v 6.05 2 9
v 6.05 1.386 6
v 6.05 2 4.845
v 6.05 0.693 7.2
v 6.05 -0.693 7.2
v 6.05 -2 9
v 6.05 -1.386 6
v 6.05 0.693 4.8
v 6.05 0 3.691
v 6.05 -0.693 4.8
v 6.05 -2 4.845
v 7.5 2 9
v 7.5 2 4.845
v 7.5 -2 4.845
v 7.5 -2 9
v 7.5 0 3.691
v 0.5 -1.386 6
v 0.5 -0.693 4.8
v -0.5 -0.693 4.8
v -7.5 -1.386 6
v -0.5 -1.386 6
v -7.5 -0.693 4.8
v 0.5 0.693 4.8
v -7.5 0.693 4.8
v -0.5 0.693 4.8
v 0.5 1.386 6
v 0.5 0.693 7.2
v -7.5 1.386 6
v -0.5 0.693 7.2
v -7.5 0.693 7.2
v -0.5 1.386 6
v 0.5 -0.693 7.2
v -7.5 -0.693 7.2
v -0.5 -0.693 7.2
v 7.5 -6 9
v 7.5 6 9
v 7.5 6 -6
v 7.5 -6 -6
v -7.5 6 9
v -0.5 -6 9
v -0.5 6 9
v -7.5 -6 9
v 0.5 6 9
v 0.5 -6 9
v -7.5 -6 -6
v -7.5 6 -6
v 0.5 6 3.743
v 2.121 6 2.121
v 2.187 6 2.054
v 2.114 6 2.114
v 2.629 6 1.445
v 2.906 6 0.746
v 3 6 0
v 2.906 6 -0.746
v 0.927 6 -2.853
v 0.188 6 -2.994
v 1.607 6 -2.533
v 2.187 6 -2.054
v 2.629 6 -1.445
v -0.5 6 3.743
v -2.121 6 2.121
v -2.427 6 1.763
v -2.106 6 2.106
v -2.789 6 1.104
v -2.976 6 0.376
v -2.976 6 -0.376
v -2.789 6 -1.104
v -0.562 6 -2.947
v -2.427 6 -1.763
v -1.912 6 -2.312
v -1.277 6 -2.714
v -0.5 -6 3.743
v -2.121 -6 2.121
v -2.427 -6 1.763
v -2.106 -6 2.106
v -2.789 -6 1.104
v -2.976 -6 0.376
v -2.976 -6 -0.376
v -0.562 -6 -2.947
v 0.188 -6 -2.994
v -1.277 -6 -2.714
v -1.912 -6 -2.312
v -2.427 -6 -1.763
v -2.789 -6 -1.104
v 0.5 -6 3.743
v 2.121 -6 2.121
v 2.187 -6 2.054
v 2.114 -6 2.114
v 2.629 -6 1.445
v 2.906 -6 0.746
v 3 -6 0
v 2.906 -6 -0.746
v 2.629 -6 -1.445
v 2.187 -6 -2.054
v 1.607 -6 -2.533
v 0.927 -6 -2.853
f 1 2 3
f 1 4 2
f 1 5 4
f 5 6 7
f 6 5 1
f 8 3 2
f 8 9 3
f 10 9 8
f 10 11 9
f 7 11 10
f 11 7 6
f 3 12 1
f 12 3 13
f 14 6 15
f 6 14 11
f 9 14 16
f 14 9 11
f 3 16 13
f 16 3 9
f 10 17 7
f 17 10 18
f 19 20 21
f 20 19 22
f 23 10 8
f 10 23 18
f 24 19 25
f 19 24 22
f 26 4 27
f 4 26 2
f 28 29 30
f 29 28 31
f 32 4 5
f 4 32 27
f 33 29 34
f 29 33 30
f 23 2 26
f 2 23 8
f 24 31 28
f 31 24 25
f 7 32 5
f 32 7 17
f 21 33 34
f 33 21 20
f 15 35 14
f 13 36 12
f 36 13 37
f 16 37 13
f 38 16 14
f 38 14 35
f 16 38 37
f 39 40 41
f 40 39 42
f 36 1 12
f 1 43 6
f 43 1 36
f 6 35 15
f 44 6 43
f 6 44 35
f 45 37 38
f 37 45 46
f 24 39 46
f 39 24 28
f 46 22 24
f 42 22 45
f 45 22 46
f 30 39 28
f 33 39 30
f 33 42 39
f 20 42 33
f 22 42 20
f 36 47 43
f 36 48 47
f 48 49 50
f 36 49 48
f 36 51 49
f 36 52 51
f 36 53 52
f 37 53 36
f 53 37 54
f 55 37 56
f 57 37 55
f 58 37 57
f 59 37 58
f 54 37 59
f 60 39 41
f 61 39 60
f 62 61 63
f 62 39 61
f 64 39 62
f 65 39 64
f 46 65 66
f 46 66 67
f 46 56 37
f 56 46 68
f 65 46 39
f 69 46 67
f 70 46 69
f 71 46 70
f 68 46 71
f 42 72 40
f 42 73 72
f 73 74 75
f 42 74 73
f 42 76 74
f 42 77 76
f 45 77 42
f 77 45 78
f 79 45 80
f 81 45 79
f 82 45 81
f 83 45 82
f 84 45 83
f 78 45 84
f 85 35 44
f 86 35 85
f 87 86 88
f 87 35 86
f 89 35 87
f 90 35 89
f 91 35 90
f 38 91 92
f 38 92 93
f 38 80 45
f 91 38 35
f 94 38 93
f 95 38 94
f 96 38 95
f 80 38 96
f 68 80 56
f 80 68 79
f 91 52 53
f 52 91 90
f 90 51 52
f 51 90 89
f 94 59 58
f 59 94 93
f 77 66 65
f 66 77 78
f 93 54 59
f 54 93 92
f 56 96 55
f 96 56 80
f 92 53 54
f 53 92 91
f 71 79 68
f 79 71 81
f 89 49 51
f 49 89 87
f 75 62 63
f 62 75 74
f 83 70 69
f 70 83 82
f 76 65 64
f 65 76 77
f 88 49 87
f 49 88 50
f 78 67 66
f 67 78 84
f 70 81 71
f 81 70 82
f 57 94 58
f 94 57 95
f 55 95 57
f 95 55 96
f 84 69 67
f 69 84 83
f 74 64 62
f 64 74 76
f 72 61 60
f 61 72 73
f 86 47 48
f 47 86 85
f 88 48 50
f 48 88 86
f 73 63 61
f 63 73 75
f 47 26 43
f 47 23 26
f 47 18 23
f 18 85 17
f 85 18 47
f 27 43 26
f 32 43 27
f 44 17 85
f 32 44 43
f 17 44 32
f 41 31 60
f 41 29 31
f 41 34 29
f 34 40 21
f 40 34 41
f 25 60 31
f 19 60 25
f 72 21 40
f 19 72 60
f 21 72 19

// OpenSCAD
pi = 3.1415926535897932384626433832795;

////////////////////////////////////////////////////////////////////////////////////////////////
//                                 Module list                                                              //
////////////////////////////////////////////////////////////////////////////////////////////////

//	RodClamp()


////////////////////////////////////////////////////////////////////////////////////////////////
//                                 Module parameters                                                  //
////////////////////////////////////////////////////////////////////////////////////////////////

//RodClamp()
//	width = width of main block
//	height = height of main block
//	depth = depth of main block
//	boreheight = height of center of shaft from base
//	boreradius = radius of bore
//	gapwidth = width of clamp gap
//	screwbore = bore hole radius for clamp screw
//	screwstyle = 0-hex side aligned, 1-hex top aligned, 2-round
//	captivestyle = 0-hex side aligned, 1-hex top aligned, 2-square open to top, 3-hex base open top
//	captivebore = bore hole radius of captive nut
//	captivedepth = thicknes of captuve nut


////////////////////////////////////////////////////////////////////////////////////////////////
//                                 Module definitions                                                   //
////////////////////////////////////////////////////////////////////////////////////////////////

module RodClamp()
{
  //width = width of main block
  //height = height of main block
  //depth = depth of main block
  //boreheight = height of center of shaft from base
  //boreradius = radius of bore
  //gapwidth = width of clamp gap
  //screwbore = bore hole radius for clamp screw
  //screwstyle = 0-hex side aligned, 1-hex top aligned, 2-round
  //captivestyle = 0-hex side aligned, 1-hex top aligned, 2-square open to top, 3-hex base open top
  //captivebore = bore hole radius of captive nut
  //captivedepth = thicknes of captuve nut

  upper = (height - boreheight - boreradius);
  screwoffset = (upper / 2) + boreradius;
  difference()
  {
    translate([-width/2, -depth/2, -boreheight])
      cube([width, depth, height]);
    rotate(90, [1, 0, 0])
      cylinder(r = boreradius, h = depth + 0.1, center = true, $fn = 25);
    translate([0, -(depth + 0.1) / 2, 0])
      rotate(-45, [0, 1, 0])
      cube([boreradius, depth + 0.1, boreradius]);
    translate([-gapwidth / 2, -(depth + 0.1) / 2, 0])
    cube([gapwidth, depth + 0.1, height - boreheight + 0.1]);
    translate([0, 0, screwoffset])
    {
      rotate(90, [0, 1, 0])
        if (screwstyle == 0)
          cylinder(r = screwbore, h = width + 0.1, center = true, $fn = 6);
        else if (screwstyle == 1)
          rotate(30, [0, 0, 1])
          cylinder(r = screwbore / 0.866025, h = width + 0.1, center = true, $fn = 6);
        else if (screwstyle == 2)
          cylinder(r = screwbore / 0.866025, h = width + 0.1, center = true, $fn = 20);
      translate([((width - captivedepth) / 2) + 0.1, 0, 0])
      {
      if (captivestyle == 0)
        rotate(90, [0, 1, 0])
          cylinder(r = captivebore / 0.866025, h = captivedepth + 0.1, center = true, $fn = 6);
      else if (captivestyle == 1)
        rotate(90, [0, 1, 0])
          rotate(30, [0, 0, 1])
            cylinder(r = captivebore / 0.866025, h = captivedepth + 0.1, center = true, $fn = 6);
      else if (captivestyle == 2)
        translate([0, 0, ((upper + (captivebore * 2)) / 4) - ((captivebore * 2)/ 1.8)])
        cube([captivedepth + 0.1, captivebore * 2, ((upper + (captivebore * 2)) / 1.8)], center = true);
      else if (captivestyle == 3)
      {
        translate([0, 0, ((upper + captivebore) / 4)])
        cube([captivedepth + 0.1, captivebore * 2, ((upper + captivebore) / 1.7)], center = true);
        rotate(90, [0, 1, 0])
          cylinder(r = captivebore / 0.866025, h = captivedepth + 0.1, center = true, $fn = 6);
      }
      }
    }
  }
}

////////////////////////////////////////////////////////////////////////////////////////////////
//                                 Module tests                                                           //
////////////////////////////////////////////////////////////////////////////////////////////////

RodClamp(width = 15, height = 15, depth = 12, boreheight = 6, boreradius = 3, gapwidth = 1, screwbore = 1.2, screwstyle = 1, captivestyle = 3, captivebore = 2, captivedepth = 1.5);
